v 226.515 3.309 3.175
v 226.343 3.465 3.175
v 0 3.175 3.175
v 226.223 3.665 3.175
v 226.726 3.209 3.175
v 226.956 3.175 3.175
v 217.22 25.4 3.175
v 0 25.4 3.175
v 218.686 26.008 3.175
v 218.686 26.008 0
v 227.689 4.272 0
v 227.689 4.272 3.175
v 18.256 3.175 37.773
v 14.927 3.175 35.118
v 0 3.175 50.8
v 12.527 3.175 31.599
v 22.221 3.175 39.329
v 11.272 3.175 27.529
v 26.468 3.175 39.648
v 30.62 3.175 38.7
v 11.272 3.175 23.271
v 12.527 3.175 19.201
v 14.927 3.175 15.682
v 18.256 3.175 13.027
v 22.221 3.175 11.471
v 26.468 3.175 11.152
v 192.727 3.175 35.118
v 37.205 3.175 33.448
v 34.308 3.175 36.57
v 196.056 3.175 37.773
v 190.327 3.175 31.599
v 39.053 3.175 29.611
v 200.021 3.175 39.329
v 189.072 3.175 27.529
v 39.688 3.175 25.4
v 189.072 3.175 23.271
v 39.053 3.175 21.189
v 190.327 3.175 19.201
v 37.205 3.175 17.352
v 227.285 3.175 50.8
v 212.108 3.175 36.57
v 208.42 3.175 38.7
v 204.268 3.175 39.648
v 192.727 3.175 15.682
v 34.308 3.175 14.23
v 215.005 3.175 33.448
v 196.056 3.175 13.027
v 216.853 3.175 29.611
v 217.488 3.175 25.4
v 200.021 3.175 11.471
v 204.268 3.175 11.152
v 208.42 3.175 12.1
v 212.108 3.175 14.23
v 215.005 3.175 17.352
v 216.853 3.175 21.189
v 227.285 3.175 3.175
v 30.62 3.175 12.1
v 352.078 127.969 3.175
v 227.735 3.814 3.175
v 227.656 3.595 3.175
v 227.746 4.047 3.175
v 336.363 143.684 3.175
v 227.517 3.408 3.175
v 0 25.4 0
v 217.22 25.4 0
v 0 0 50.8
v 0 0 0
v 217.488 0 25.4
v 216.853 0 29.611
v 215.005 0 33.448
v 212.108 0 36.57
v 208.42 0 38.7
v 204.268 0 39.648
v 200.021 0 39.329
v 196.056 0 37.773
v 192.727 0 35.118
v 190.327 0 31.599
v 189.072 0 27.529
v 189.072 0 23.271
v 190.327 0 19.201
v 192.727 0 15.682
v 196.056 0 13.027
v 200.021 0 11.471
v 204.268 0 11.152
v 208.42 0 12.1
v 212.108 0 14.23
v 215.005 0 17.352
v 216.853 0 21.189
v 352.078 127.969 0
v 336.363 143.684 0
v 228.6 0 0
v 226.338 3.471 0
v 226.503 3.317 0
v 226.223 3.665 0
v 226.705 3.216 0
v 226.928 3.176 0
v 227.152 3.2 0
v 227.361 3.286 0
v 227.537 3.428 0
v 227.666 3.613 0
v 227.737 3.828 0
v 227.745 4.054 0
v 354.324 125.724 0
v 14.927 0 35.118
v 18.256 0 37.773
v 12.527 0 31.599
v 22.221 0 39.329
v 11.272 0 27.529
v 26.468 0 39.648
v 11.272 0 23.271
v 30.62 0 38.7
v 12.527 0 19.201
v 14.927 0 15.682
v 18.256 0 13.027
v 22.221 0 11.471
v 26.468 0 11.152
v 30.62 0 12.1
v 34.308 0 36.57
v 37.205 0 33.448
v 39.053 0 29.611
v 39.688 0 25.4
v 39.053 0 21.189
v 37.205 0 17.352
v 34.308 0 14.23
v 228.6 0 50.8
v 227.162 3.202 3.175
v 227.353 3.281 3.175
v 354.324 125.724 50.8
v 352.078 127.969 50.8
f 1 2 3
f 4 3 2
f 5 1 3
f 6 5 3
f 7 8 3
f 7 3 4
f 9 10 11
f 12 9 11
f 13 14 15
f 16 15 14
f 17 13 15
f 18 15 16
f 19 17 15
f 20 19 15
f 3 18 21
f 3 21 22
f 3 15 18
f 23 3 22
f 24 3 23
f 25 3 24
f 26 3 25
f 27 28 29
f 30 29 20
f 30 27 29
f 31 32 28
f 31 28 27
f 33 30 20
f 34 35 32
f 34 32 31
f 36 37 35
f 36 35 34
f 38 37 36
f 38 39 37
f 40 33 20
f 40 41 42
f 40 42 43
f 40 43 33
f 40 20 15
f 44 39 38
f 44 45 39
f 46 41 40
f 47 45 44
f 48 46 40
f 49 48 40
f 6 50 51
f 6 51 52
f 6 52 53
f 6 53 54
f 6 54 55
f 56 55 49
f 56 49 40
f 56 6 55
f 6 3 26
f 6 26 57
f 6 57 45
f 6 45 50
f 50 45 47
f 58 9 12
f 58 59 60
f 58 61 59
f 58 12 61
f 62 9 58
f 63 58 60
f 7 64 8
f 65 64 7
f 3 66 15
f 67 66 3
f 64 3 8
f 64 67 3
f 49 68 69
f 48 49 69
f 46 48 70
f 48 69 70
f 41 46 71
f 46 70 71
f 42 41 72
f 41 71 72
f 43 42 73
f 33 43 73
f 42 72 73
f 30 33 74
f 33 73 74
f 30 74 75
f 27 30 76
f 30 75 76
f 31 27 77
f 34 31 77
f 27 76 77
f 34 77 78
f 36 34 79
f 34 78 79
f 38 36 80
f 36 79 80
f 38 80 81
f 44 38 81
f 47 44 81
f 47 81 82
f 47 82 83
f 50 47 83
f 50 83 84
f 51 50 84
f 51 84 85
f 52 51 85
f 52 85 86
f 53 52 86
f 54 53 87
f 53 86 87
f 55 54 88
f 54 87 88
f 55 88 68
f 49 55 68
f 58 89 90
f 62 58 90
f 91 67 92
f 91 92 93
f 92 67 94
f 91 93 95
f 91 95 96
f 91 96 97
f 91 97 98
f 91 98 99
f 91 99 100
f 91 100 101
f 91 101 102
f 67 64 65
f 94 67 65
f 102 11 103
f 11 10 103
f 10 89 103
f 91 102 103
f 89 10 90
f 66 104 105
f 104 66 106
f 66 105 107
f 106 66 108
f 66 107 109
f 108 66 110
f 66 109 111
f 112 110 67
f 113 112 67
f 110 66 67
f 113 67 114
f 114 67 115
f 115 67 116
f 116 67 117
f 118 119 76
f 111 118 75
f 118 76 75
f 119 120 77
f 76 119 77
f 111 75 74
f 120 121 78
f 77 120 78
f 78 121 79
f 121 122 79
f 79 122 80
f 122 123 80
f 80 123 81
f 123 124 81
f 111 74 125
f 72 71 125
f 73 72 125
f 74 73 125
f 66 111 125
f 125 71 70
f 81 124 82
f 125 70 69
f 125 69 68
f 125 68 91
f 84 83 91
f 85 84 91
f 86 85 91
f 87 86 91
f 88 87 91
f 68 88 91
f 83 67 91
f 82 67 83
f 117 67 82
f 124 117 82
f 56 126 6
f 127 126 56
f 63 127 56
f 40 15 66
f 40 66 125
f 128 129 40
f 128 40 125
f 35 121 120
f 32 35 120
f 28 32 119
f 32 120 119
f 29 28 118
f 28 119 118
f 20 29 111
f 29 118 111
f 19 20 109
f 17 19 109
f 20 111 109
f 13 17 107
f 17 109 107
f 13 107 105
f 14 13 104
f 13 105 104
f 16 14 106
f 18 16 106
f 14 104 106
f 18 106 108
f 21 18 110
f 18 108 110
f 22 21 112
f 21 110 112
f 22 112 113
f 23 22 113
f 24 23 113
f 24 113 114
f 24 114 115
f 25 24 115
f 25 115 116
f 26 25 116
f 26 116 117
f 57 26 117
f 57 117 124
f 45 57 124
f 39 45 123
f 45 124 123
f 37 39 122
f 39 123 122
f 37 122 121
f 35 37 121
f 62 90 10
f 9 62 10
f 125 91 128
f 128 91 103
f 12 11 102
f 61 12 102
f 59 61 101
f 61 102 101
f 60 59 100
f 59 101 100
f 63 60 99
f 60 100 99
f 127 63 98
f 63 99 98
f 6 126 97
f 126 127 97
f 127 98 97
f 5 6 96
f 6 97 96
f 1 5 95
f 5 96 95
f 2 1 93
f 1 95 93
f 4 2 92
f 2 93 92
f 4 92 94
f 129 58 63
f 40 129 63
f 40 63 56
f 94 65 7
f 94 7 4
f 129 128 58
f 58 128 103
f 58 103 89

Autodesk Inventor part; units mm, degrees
ref_plane "YZ Plane" through (0, 0, 0) normal (1, 0, 0) x (0, 1, 0)
ref_plane "XZ Plane" through (0, 0, 0) normal (0, 1, 0) x (-1, 0, 0)
ref_plane "XY Plane" through (0, 0, 0) normal (0, 0, 1) x (1, 0, 0)
sketch "Sketch1" plane through (0, 0, 0) normal (0, 0, 1) x (1, 0, 0)
  line L0 (0, 0) -> (228.6, 0)
  line L1 (228.6, 0) -> (354.3236, 125.7236)
  line L2 (354.3236, 125.7236) -> (352.0785, 127.9686)
  line L3 (352.0785, 127.9686) -> (227.2849, 3.175)
  line L4 (0, 0) -> (0, 3.175)
  line L5 (0, 3.175) -> (227.2849, 3.175)
  line L6 (0, 3.175) -> (0, 25.4)
  line L7 (0, 25.4) -> (217.2198, 25.4)
  line L8 (352.0785, 127.9686) -> (336.3631, 143.6841)
  line L9 (336.3631, 143.6841) -> (218.6865, 26.0075)
  line L10 (217.2198, 25.4) -> (226.2228, 3.665)
  line L11 (218.6865, 26.0075) -> (227.6894, 4.2725)
  arc A0 (226.2228, 3.665) -> (227.6894, 4.2725) centre (226.9561, 3.9688) ccw
  line L12 (217.2198, 25.4) -> (218.079, 25.4) construction
  line L13 (218.6865, 26.0075) -> (218.079, 25.4) construction
  dimension "d4" = 3.175
  dimension "d6" = 3.175
  dimension "d8" = 25.4
  dimension "d9" = 25.4
  dimension "d10" = 45
  dimension "d11" = 228.6
  dimension "d12" = 177.8
  dimension "d13" = 1.5875
extrude "Extrusion1" add sketch "Sketch1" along normal blind 3.175 contours L6 L7 L10 A0 L5 | A0 L3 L5 | L3 A0 L11 L9 L8
extrude "Extrusion2" add sketch "Sketch1" along normal blind 50.8 contours L4 L5 L3 L2 L1 L0
sketch "Sketch2" plane through (0, 0, 0) normal (0, -1, 0) x (1, 0, 0)
  line L0 (0, 0) -> (0, 50.8) projected
  line L1 (0, 0) -> (228.6, 0) projected
  line L2 (228.6, 0) -> (228.6, 50.8) projected
  circle A0 centre (25.4, 25.4) radius 14.2875
  circle A1 centre (203.2, 25.4) radius 14.2875
  dimension "d18" = 28.575
  dimension "d19" = 25.4
  dimension "d20" = 25.4
  dimension "d21" = 25.4
extrude "Extrusion3" cut sketch "Sketch2" against normal through all
equation "\"d4\" = d6"
properties part number "8 ball bottom 1 by 2 L"
